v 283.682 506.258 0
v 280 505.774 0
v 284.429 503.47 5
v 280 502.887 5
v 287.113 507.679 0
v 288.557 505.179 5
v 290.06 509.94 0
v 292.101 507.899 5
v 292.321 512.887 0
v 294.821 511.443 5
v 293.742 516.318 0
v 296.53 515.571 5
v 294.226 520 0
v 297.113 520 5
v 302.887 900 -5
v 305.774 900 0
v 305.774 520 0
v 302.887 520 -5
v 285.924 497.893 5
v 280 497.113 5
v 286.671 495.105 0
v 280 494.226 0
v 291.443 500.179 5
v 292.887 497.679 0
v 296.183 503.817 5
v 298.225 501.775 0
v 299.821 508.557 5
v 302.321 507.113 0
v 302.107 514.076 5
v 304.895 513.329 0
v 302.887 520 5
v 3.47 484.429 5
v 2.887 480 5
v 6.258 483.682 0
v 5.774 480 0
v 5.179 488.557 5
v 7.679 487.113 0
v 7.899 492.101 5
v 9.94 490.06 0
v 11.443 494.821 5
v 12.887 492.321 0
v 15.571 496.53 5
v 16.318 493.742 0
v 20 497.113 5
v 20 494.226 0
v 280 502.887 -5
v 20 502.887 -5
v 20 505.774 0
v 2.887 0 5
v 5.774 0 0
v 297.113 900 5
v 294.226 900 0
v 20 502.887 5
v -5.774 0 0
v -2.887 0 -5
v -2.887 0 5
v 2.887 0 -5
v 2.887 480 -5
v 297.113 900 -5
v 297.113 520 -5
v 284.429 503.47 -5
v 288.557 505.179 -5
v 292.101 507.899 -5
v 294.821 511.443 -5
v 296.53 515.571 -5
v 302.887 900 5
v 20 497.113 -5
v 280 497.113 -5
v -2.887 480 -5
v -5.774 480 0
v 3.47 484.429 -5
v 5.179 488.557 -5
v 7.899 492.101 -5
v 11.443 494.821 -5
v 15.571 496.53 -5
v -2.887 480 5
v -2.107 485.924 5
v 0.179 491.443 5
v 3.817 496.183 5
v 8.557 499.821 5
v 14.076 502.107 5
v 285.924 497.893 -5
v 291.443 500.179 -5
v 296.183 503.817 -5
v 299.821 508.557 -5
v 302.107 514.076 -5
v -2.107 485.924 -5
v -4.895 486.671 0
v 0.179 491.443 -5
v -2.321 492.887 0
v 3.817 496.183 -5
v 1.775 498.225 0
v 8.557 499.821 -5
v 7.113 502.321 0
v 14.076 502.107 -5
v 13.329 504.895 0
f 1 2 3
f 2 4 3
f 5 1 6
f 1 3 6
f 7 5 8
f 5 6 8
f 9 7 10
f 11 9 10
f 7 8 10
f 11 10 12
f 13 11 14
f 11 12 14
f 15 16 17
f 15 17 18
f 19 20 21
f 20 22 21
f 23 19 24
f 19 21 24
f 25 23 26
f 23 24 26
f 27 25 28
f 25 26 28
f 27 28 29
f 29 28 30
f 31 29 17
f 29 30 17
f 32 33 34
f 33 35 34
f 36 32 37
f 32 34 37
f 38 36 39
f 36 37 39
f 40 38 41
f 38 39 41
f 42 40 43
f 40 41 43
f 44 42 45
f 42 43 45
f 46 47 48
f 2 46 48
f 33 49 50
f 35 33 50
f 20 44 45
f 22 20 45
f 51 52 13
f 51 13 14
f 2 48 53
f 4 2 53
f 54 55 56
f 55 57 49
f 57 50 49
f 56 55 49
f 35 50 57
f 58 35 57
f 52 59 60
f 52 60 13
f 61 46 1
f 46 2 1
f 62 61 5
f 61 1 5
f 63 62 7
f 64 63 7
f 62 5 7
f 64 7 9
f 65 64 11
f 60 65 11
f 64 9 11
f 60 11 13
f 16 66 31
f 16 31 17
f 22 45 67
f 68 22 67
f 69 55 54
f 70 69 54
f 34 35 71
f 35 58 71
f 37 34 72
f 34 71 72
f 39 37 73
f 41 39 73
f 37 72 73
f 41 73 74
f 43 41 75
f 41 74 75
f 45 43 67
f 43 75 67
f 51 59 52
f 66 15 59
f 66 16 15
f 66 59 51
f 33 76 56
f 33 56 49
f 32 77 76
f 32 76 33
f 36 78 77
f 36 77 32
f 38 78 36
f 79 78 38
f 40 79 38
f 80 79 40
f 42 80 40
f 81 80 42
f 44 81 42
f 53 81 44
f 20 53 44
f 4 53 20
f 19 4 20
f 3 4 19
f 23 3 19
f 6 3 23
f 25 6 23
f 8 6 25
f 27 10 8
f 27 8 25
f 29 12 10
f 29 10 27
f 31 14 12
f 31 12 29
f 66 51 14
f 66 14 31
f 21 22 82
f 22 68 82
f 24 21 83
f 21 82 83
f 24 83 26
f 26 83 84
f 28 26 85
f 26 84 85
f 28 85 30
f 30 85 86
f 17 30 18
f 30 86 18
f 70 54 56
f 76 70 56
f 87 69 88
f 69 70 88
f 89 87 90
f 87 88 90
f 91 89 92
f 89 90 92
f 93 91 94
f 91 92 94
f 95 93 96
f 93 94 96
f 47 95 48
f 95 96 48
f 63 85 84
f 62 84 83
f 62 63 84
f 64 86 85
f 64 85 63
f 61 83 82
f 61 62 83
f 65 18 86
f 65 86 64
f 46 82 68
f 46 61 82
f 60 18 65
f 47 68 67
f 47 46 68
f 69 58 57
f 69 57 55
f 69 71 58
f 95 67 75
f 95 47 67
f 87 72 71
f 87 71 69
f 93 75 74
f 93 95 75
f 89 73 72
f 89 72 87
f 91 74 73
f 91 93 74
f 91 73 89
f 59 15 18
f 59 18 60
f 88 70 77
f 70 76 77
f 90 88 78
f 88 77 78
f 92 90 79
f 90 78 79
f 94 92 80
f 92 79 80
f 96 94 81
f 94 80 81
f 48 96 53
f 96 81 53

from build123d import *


with BuildPart() as part:
    # Sweep3: sweep along a path in Sketch2
    with BuildLine(Plane.XY) as sweep3_path:
        Line((0, 0), (0, 480))
        ThreePointArc((0, 480), (5.857864376, 494.142135624), (20, 500))
        Line((20, 500), (280, 500))
        ThreePointArc((280, 500), (294.142135624, 505.857864376), (300, 520))
        Line((300, 520), (300, 900))
    # Sketch3 → Sweep3 (sweep)
    with BuildSketch(Plane(origin=(0, 0, 0), x_dir=(1, 0, 0), z_dir=(0, 1, 0))):
        Polygon((2.886751346, 5), (-2.886751346, 5), (-5.773502692, 0), (-2.886751346, -5), (2.886751346, -5), (5.773502692, 0), align=None)
    sweep(path=sweep3_path.line)


solid = part.part
